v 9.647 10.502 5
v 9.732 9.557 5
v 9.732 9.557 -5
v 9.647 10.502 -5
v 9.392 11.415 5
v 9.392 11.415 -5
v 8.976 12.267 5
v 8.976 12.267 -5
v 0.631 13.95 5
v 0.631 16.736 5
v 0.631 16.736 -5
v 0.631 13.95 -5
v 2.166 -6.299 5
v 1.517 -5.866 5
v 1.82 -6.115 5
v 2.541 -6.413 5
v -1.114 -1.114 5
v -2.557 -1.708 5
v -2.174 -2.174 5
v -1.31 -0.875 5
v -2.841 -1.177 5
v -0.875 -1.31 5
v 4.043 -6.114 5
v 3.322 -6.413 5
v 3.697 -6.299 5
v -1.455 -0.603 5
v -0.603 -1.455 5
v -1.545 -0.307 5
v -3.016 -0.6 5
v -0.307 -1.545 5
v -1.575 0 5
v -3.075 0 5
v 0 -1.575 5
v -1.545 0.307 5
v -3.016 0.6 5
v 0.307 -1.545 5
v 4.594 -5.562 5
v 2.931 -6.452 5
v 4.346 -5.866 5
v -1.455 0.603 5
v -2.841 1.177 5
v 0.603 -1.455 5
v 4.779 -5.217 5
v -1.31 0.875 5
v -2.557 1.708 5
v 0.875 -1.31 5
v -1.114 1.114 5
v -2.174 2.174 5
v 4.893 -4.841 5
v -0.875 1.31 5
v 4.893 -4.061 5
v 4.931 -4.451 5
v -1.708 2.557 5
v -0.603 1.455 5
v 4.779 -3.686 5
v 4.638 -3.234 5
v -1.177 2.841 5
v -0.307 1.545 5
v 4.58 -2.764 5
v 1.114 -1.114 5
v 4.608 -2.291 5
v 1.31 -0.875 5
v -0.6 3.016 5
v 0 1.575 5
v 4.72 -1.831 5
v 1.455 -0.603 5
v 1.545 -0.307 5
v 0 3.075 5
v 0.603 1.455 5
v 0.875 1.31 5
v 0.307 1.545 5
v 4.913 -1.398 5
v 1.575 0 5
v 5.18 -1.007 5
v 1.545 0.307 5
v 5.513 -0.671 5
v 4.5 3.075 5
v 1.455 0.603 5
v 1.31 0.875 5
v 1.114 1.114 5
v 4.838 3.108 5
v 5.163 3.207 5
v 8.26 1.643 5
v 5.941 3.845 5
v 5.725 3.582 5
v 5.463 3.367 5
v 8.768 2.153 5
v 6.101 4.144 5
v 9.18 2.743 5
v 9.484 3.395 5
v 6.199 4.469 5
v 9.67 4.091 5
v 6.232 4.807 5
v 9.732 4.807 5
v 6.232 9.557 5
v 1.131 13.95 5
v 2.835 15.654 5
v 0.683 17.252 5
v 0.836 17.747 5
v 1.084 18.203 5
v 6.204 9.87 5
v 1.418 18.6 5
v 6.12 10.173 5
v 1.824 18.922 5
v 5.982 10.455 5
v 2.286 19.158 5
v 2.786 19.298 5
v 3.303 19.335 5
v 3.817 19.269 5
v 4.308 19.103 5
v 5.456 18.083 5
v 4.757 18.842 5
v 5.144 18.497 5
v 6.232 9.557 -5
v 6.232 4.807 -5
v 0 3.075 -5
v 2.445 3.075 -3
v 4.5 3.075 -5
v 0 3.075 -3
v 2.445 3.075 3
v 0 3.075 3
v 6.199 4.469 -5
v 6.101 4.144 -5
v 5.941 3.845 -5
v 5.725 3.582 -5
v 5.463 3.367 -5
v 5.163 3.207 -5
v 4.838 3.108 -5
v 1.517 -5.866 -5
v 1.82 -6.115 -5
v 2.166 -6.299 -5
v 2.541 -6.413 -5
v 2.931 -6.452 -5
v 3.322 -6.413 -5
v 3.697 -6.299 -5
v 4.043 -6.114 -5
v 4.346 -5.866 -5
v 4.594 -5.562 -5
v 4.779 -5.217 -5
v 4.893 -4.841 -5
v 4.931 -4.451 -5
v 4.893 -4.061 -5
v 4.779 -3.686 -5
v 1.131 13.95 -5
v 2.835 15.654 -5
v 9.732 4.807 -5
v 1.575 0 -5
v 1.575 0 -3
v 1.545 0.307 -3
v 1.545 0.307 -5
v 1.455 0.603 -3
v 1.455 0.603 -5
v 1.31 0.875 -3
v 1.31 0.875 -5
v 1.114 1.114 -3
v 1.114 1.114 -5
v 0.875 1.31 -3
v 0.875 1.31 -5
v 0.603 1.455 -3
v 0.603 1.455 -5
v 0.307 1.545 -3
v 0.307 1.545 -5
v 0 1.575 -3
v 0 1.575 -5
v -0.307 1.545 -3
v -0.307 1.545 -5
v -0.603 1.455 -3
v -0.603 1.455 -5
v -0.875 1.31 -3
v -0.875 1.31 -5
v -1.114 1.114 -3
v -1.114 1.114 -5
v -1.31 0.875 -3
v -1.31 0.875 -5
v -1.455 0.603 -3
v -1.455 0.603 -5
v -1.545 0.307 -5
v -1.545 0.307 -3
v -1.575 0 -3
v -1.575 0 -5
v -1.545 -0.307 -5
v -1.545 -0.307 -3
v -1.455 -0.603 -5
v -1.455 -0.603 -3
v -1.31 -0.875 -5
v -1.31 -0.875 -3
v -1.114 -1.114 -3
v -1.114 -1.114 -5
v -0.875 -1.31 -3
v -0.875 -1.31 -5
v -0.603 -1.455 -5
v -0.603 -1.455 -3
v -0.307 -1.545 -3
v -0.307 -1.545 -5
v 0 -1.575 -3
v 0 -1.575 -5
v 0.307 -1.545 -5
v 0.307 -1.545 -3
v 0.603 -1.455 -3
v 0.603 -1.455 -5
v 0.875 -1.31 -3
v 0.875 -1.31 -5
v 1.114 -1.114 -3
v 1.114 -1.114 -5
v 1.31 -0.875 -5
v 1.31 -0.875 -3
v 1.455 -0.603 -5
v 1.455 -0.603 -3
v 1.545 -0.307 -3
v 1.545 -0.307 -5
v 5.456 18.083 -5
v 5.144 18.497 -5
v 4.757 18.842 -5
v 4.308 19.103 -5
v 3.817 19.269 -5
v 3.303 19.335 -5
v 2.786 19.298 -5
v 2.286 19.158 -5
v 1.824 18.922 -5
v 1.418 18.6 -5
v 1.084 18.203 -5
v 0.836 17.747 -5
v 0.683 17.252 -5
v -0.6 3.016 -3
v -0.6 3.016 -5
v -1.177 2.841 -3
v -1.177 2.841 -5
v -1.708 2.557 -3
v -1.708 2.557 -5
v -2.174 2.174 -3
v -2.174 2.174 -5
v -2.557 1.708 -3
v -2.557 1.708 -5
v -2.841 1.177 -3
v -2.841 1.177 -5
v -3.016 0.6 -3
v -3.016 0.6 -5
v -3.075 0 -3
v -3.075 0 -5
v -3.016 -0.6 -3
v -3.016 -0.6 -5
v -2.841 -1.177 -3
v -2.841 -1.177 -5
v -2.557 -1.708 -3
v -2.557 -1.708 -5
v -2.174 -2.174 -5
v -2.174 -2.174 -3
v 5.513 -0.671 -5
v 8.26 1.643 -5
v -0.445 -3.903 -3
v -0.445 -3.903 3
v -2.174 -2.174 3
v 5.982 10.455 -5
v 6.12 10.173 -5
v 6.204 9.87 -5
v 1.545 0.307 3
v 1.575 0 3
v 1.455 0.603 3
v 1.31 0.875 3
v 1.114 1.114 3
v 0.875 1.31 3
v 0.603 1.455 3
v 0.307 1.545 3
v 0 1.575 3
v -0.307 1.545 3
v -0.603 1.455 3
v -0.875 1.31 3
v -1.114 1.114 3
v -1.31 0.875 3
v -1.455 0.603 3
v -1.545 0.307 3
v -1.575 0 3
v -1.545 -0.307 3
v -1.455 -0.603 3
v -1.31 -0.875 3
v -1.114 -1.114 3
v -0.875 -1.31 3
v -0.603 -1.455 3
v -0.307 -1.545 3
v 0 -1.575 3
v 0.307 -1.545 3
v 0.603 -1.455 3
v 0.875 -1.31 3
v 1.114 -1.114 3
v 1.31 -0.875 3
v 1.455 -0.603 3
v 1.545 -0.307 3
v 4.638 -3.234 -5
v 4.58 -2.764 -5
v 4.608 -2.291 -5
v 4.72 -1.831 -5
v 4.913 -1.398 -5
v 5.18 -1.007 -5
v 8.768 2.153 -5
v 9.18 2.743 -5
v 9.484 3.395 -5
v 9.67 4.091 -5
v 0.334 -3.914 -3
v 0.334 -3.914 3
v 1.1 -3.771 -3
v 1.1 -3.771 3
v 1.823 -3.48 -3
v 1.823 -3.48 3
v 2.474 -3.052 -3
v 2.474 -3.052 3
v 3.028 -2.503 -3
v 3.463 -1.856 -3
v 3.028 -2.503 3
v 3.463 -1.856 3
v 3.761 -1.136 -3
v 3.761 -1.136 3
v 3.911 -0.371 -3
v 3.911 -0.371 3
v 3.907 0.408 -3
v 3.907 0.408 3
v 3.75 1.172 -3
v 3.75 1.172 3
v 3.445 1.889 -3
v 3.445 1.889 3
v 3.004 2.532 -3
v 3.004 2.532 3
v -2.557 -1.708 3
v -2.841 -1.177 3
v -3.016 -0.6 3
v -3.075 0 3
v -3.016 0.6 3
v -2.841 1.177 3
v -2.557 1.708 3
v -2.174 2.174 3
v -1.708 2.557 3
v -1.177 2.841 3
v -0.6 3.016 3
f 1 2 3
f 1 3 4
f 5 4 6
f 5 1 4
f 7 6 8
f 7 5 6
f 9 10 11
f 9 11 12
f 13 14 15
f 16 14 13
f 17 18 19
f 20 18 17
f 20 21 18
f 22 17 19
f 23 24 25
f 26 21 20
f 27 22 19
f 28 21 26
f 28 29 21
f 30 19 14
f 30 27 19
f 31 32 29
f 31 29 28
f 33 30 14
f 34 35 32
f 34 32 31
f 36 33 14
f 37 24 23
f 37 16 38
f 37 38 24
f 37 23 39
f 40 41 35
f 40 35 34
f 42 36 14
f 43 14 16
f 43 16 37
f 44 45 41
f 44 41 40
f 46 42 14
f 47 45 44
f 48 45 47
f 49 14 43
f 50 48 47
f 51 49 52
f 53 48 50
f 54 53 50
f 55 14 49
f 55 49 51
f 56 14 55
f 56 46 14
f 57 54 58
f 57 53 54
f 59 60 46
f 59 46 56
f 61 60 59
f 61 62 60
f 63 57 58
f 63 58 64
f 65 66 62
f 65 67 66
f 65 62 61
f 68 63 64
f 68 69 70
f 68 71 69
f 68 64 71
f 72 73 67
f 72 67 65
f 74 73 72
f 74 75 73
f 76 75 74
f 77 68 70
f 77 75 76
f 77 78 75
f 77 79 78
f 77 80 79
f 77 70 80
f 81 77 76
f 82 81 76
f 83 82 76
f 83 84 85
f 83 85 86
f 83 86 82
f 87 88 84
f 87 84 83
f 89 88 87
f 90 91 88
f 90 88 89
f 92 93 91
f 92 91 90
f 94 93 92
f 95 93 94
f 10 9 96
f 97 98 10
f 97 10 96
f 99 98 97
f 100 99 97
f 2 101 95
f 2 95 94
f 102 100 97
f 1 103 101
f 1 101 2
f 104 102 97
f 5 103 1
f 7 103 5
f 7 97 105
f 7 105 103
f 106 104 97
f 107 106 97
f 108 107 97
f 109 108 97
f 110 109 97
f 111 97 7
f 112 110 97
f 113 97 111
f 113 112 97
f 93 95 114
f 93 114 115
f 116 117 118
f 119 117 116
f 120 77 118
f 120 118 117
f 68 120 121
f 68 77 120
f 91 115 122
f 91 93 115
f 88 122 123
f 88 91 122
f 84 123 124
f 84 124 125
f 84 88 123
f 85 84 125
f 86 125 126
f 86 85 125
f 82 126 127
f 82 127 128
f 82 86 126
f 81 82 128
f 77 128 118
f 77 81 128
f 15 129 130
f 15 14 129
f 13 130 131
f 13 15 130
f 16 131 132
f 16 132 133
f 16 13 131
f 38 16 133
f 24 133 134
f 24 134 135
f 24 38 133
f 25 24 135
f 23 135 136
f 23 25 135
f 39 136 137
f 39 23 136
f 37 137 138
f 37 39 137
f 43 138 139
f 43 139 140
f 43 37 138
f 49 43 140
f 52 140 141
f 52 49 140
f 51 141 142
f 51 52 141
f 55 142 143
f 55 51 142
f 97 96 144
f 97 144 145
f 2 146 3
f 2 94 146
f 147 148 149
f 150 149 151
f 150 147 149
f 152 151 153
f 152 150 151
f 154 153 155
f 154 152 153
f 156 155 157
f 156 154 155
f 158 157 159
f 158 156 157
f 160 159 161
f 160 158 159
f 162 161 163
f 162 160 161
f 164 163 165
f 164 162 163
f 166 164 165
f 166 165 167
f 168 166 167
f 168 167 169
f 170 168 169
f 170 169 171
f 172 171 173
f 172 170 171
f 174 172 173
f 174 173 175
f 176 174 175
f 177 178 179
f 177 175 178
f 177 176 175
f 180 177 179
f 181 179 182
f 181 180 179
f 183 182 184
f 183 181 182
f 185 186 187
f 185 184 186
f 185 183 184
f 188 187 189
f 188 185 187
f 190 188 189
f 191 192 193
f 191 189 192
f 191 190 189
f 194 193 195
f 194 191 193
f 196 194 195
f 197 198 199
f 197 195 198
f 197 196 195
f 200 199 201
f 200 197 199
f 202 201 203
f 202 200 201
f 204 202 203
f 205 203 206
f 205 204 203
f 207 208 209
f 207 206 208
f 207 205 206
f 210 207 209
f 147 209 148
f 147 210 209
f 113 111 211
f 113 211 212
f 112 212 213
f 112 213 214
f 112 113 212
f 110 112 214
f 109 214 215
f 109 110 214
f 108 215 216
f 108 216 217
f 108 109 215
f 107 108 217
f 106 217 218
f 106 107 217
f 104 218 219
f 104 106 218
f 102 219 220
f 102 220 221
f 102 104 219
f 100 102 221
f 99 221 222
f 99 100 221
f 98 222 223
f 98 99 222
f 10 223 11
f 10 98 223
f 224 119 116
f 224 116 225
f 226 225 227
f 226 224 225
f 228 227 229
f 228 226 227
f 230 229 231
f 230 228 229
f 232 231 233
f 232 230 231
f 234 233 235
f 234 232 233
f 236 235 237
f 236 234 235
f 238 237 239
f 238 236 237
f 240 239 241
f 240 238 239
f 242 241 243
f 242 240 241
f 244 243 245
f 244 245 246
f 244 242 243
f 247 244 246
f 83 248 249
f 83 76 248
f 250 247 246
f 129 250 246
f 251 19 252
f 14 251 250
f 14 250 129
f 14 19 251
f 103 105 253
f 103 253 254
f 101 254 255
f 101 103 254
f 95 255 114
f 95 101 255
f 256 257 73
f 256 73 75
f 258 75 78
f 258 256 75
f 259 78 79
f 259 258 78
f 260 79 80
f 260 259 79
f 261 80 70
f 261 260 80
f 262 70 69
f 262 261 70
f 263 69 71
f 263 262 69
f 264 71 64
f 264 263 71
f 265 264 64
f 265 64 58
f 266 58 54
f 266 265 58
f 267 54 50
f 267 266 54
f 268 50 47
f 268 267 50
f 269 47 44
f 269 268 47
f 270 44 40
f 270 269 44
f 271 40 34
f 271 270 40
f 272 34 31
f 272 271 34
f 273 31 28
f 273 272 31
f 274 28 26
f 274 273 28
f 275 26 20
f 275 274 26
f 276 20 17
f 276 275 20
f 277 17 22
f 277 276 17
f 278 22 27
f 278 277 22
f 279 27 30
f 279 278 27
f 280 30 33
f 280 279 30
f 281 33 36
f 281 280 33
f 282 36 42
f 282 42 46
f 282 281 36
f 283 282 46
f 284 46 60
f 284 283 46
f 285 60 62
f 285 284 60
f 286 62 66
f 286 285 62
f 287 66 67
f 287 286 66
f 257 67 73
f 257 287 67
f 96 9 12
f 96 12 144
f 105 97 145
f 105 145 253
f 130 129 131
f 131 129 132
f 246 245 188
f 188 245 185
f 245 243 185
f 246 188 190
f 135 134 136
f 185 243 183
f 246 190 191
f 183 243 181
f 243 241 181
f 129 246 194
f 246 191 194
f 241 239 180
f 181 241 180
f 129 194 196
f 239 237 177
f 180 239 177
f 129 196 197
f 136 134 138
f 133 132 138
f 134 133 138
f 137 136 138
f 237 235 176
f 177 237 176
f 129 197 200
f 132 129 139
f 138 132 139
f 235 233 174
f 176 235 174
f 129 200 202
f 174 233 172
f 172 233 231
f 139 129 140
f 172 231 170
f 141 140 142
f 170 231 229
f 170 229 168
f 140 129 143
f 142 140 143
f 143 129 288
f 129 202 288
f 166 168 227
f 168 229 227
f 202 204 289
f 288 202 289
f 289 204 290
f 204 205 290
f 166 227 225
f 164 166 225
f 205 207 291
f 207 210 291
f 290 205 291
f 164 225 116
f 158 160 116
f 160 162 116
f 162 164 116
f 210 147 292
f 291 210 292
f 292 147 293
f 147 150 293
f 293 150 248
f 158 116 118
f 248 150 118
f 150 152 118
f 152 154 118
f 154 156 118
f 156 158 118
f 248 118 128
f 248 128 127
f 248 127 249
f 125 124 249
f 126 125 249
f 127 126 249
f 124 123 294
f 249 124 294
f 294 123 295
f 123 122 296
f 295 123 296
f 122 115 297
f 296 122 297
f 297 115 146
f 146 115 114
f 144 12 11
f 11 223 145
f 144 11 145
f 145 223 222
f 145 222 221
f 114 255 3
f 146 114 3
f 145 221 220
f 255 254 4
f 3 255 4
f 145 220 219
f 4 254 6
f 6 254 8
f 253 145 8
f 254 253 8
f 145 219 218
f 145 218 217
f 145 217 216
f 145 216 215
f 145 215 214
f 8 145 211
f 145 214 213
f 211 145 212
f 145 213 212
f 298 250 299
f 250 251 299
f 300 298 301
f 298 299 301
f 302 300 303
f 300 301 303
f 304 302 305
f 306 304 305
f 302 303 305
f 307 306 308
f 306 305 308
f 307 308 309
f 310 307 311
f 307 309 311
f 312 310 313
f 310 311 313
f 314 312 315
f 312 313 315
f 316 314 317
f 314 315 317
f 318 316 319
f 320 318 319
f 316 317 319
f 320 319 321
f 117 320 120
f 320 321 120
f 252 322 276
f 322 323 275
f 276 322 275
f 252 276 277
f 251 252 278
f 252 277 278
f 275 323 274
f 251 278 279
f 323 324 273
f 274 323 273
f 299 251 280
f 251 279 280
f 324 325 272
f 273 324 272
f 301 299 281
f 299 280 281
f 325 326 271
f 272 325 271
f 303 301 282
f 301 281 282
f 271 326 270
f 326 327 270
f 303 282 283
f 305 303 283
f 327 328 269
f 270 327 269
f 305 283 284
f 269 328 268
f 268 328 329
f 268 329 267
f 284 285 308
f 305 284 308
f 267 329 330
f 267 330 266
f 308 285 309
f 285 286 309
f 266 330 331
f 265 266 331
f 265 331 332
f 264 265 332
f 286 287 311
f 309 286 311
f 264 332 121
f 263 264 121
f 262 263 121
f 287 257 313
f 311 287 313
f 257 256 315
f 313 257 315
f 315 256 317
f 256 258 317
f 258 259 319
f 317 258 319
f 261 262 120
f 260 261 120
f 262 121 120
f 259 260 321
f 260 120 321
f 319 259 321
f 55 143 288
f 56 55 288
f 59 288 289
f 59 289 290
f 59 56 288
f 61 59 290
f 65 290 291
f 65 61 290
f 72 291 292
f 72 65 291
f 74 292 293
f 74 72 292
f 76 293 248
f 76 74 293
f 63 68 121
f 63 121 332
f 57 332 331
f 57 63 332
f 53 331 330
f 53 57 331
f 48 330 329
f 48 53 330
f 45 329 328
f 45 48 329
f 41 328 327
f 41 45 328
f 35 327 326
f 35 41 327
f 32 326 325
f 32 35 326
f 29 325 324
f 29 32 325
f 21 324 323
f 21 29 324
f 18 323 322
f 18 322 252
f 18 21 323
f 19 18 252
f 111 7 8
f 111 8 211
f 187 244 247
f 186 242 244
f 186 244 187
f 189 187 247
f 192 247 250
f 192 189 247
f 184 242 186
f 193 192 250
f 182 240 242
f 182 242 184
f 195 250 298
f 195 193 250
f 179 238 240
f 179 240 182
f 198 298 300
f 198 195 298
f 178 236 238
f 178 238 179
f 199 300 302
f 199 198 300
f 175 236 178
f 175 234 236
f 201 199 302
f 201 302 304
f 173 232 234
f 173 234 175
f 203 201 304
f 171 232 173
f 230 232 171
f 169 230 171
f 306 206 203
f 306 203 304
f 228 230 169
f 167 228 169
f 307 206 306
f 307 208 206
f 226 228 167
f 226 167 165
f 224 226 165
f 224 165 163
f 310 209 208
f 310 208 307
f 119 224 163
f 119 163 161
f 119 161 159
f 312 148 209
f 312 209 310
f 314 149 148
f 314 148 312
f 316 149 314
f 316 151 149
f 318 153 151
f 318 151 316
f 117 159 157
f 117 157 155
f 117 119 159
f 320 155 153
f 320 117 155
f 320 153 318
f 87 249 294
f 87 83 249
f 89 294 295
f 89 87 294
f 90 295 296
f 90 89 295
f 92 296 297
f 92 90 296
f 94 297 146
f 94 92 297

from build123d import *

# Parameters (mm, degrees)
SKETCH1_R           = 1.575
BOSS_EXTRUDE1_DEPTH = 5
SKETCH2_R           = 3.928649494
CUT_EXTRUDE1_DEPTH  = 3


with BuildPart() as part:
    # Sketch1 → Boss-Extrude1 (new, symmetric)
    with BuildSketch(Plane.XY):
        with BuildLine():
            Line((9.732479224, 4.807479224), (9.732479224, 9.557479224))
            ThreePointArc((9.732479224, 9.557479224), (9.539846423, 10.964172818), (8.976131504, 12.267292058))
            Line((8.976131504, 12.267292058), (5.455637648, 18.08252522))
            ThreePointArc((5.455637648, 18.08252522), (2.532334022, 19.240369543), (0.631218006, 16.735960338))
            Line((0.631218006, 16.735960338), (0.631218006, 13.950074632))
            Line((0.631218006, 13.950074632), (1.131218006, 13.950074632))
            Line((1.131218006, 13.950074632), (2.83470481, 15.653561435))
            Line((2.83470481, 15.653561435), (5.98205172, 10.454701026))
            ThreePointArc((5.98205172, 10.454701026), (6.168698307, 10.023236912), (6.232479224, 9.557479224))
            Line((6.232479224, 9.557479224), (6.232479224, 4.807479224))
            ThreePointArc((6.232479224, 4.807479224), (5.725047808, 3.582431417), (4.5, 3.075))
            Line((4.5, 3.075), (0, 3.075))
            ThreePointArc((0, 3.075), (-2.840929562, 1.176751555), (-2.174353352, -2.174353352))
            Line((-2.174353352, -2.174353352), (1.517126313, -5.865833018))
            ThreePointArc((1.517126313, -5.865833018), (4.042707088, -6.11440715), (4.778890142, -3.685748701))
            ThreePointArc((4.778890142, -3.685748701), (4.653279573, -2.058204966), (5.513269646, -0.670727508))
            Line((5.513269646, -0.670727508), (8.260484532, 1.643135904))
            ThreePointArc((8.260484532, 1.643135904), (9.346473058, 3.062498062), (9.732479224, 4.807479224))
        make_face()
        Circle(SKETCH1_R, mode=Mode.SUBTRACT)
    extrude(amount=BOSS_EXTRUDE1_DEPTH, both=True)

    # Sketch2 → Cut-Extrude1 (cut, symmetric)
    with BuildSketch(Plane.XY):
        Circle(SKETCH2_R)
    extrude(amount=CUT_EXTRUDE1_DEPTH, both=True, mode=Mode.SUBTRACT)


solid = part.part
